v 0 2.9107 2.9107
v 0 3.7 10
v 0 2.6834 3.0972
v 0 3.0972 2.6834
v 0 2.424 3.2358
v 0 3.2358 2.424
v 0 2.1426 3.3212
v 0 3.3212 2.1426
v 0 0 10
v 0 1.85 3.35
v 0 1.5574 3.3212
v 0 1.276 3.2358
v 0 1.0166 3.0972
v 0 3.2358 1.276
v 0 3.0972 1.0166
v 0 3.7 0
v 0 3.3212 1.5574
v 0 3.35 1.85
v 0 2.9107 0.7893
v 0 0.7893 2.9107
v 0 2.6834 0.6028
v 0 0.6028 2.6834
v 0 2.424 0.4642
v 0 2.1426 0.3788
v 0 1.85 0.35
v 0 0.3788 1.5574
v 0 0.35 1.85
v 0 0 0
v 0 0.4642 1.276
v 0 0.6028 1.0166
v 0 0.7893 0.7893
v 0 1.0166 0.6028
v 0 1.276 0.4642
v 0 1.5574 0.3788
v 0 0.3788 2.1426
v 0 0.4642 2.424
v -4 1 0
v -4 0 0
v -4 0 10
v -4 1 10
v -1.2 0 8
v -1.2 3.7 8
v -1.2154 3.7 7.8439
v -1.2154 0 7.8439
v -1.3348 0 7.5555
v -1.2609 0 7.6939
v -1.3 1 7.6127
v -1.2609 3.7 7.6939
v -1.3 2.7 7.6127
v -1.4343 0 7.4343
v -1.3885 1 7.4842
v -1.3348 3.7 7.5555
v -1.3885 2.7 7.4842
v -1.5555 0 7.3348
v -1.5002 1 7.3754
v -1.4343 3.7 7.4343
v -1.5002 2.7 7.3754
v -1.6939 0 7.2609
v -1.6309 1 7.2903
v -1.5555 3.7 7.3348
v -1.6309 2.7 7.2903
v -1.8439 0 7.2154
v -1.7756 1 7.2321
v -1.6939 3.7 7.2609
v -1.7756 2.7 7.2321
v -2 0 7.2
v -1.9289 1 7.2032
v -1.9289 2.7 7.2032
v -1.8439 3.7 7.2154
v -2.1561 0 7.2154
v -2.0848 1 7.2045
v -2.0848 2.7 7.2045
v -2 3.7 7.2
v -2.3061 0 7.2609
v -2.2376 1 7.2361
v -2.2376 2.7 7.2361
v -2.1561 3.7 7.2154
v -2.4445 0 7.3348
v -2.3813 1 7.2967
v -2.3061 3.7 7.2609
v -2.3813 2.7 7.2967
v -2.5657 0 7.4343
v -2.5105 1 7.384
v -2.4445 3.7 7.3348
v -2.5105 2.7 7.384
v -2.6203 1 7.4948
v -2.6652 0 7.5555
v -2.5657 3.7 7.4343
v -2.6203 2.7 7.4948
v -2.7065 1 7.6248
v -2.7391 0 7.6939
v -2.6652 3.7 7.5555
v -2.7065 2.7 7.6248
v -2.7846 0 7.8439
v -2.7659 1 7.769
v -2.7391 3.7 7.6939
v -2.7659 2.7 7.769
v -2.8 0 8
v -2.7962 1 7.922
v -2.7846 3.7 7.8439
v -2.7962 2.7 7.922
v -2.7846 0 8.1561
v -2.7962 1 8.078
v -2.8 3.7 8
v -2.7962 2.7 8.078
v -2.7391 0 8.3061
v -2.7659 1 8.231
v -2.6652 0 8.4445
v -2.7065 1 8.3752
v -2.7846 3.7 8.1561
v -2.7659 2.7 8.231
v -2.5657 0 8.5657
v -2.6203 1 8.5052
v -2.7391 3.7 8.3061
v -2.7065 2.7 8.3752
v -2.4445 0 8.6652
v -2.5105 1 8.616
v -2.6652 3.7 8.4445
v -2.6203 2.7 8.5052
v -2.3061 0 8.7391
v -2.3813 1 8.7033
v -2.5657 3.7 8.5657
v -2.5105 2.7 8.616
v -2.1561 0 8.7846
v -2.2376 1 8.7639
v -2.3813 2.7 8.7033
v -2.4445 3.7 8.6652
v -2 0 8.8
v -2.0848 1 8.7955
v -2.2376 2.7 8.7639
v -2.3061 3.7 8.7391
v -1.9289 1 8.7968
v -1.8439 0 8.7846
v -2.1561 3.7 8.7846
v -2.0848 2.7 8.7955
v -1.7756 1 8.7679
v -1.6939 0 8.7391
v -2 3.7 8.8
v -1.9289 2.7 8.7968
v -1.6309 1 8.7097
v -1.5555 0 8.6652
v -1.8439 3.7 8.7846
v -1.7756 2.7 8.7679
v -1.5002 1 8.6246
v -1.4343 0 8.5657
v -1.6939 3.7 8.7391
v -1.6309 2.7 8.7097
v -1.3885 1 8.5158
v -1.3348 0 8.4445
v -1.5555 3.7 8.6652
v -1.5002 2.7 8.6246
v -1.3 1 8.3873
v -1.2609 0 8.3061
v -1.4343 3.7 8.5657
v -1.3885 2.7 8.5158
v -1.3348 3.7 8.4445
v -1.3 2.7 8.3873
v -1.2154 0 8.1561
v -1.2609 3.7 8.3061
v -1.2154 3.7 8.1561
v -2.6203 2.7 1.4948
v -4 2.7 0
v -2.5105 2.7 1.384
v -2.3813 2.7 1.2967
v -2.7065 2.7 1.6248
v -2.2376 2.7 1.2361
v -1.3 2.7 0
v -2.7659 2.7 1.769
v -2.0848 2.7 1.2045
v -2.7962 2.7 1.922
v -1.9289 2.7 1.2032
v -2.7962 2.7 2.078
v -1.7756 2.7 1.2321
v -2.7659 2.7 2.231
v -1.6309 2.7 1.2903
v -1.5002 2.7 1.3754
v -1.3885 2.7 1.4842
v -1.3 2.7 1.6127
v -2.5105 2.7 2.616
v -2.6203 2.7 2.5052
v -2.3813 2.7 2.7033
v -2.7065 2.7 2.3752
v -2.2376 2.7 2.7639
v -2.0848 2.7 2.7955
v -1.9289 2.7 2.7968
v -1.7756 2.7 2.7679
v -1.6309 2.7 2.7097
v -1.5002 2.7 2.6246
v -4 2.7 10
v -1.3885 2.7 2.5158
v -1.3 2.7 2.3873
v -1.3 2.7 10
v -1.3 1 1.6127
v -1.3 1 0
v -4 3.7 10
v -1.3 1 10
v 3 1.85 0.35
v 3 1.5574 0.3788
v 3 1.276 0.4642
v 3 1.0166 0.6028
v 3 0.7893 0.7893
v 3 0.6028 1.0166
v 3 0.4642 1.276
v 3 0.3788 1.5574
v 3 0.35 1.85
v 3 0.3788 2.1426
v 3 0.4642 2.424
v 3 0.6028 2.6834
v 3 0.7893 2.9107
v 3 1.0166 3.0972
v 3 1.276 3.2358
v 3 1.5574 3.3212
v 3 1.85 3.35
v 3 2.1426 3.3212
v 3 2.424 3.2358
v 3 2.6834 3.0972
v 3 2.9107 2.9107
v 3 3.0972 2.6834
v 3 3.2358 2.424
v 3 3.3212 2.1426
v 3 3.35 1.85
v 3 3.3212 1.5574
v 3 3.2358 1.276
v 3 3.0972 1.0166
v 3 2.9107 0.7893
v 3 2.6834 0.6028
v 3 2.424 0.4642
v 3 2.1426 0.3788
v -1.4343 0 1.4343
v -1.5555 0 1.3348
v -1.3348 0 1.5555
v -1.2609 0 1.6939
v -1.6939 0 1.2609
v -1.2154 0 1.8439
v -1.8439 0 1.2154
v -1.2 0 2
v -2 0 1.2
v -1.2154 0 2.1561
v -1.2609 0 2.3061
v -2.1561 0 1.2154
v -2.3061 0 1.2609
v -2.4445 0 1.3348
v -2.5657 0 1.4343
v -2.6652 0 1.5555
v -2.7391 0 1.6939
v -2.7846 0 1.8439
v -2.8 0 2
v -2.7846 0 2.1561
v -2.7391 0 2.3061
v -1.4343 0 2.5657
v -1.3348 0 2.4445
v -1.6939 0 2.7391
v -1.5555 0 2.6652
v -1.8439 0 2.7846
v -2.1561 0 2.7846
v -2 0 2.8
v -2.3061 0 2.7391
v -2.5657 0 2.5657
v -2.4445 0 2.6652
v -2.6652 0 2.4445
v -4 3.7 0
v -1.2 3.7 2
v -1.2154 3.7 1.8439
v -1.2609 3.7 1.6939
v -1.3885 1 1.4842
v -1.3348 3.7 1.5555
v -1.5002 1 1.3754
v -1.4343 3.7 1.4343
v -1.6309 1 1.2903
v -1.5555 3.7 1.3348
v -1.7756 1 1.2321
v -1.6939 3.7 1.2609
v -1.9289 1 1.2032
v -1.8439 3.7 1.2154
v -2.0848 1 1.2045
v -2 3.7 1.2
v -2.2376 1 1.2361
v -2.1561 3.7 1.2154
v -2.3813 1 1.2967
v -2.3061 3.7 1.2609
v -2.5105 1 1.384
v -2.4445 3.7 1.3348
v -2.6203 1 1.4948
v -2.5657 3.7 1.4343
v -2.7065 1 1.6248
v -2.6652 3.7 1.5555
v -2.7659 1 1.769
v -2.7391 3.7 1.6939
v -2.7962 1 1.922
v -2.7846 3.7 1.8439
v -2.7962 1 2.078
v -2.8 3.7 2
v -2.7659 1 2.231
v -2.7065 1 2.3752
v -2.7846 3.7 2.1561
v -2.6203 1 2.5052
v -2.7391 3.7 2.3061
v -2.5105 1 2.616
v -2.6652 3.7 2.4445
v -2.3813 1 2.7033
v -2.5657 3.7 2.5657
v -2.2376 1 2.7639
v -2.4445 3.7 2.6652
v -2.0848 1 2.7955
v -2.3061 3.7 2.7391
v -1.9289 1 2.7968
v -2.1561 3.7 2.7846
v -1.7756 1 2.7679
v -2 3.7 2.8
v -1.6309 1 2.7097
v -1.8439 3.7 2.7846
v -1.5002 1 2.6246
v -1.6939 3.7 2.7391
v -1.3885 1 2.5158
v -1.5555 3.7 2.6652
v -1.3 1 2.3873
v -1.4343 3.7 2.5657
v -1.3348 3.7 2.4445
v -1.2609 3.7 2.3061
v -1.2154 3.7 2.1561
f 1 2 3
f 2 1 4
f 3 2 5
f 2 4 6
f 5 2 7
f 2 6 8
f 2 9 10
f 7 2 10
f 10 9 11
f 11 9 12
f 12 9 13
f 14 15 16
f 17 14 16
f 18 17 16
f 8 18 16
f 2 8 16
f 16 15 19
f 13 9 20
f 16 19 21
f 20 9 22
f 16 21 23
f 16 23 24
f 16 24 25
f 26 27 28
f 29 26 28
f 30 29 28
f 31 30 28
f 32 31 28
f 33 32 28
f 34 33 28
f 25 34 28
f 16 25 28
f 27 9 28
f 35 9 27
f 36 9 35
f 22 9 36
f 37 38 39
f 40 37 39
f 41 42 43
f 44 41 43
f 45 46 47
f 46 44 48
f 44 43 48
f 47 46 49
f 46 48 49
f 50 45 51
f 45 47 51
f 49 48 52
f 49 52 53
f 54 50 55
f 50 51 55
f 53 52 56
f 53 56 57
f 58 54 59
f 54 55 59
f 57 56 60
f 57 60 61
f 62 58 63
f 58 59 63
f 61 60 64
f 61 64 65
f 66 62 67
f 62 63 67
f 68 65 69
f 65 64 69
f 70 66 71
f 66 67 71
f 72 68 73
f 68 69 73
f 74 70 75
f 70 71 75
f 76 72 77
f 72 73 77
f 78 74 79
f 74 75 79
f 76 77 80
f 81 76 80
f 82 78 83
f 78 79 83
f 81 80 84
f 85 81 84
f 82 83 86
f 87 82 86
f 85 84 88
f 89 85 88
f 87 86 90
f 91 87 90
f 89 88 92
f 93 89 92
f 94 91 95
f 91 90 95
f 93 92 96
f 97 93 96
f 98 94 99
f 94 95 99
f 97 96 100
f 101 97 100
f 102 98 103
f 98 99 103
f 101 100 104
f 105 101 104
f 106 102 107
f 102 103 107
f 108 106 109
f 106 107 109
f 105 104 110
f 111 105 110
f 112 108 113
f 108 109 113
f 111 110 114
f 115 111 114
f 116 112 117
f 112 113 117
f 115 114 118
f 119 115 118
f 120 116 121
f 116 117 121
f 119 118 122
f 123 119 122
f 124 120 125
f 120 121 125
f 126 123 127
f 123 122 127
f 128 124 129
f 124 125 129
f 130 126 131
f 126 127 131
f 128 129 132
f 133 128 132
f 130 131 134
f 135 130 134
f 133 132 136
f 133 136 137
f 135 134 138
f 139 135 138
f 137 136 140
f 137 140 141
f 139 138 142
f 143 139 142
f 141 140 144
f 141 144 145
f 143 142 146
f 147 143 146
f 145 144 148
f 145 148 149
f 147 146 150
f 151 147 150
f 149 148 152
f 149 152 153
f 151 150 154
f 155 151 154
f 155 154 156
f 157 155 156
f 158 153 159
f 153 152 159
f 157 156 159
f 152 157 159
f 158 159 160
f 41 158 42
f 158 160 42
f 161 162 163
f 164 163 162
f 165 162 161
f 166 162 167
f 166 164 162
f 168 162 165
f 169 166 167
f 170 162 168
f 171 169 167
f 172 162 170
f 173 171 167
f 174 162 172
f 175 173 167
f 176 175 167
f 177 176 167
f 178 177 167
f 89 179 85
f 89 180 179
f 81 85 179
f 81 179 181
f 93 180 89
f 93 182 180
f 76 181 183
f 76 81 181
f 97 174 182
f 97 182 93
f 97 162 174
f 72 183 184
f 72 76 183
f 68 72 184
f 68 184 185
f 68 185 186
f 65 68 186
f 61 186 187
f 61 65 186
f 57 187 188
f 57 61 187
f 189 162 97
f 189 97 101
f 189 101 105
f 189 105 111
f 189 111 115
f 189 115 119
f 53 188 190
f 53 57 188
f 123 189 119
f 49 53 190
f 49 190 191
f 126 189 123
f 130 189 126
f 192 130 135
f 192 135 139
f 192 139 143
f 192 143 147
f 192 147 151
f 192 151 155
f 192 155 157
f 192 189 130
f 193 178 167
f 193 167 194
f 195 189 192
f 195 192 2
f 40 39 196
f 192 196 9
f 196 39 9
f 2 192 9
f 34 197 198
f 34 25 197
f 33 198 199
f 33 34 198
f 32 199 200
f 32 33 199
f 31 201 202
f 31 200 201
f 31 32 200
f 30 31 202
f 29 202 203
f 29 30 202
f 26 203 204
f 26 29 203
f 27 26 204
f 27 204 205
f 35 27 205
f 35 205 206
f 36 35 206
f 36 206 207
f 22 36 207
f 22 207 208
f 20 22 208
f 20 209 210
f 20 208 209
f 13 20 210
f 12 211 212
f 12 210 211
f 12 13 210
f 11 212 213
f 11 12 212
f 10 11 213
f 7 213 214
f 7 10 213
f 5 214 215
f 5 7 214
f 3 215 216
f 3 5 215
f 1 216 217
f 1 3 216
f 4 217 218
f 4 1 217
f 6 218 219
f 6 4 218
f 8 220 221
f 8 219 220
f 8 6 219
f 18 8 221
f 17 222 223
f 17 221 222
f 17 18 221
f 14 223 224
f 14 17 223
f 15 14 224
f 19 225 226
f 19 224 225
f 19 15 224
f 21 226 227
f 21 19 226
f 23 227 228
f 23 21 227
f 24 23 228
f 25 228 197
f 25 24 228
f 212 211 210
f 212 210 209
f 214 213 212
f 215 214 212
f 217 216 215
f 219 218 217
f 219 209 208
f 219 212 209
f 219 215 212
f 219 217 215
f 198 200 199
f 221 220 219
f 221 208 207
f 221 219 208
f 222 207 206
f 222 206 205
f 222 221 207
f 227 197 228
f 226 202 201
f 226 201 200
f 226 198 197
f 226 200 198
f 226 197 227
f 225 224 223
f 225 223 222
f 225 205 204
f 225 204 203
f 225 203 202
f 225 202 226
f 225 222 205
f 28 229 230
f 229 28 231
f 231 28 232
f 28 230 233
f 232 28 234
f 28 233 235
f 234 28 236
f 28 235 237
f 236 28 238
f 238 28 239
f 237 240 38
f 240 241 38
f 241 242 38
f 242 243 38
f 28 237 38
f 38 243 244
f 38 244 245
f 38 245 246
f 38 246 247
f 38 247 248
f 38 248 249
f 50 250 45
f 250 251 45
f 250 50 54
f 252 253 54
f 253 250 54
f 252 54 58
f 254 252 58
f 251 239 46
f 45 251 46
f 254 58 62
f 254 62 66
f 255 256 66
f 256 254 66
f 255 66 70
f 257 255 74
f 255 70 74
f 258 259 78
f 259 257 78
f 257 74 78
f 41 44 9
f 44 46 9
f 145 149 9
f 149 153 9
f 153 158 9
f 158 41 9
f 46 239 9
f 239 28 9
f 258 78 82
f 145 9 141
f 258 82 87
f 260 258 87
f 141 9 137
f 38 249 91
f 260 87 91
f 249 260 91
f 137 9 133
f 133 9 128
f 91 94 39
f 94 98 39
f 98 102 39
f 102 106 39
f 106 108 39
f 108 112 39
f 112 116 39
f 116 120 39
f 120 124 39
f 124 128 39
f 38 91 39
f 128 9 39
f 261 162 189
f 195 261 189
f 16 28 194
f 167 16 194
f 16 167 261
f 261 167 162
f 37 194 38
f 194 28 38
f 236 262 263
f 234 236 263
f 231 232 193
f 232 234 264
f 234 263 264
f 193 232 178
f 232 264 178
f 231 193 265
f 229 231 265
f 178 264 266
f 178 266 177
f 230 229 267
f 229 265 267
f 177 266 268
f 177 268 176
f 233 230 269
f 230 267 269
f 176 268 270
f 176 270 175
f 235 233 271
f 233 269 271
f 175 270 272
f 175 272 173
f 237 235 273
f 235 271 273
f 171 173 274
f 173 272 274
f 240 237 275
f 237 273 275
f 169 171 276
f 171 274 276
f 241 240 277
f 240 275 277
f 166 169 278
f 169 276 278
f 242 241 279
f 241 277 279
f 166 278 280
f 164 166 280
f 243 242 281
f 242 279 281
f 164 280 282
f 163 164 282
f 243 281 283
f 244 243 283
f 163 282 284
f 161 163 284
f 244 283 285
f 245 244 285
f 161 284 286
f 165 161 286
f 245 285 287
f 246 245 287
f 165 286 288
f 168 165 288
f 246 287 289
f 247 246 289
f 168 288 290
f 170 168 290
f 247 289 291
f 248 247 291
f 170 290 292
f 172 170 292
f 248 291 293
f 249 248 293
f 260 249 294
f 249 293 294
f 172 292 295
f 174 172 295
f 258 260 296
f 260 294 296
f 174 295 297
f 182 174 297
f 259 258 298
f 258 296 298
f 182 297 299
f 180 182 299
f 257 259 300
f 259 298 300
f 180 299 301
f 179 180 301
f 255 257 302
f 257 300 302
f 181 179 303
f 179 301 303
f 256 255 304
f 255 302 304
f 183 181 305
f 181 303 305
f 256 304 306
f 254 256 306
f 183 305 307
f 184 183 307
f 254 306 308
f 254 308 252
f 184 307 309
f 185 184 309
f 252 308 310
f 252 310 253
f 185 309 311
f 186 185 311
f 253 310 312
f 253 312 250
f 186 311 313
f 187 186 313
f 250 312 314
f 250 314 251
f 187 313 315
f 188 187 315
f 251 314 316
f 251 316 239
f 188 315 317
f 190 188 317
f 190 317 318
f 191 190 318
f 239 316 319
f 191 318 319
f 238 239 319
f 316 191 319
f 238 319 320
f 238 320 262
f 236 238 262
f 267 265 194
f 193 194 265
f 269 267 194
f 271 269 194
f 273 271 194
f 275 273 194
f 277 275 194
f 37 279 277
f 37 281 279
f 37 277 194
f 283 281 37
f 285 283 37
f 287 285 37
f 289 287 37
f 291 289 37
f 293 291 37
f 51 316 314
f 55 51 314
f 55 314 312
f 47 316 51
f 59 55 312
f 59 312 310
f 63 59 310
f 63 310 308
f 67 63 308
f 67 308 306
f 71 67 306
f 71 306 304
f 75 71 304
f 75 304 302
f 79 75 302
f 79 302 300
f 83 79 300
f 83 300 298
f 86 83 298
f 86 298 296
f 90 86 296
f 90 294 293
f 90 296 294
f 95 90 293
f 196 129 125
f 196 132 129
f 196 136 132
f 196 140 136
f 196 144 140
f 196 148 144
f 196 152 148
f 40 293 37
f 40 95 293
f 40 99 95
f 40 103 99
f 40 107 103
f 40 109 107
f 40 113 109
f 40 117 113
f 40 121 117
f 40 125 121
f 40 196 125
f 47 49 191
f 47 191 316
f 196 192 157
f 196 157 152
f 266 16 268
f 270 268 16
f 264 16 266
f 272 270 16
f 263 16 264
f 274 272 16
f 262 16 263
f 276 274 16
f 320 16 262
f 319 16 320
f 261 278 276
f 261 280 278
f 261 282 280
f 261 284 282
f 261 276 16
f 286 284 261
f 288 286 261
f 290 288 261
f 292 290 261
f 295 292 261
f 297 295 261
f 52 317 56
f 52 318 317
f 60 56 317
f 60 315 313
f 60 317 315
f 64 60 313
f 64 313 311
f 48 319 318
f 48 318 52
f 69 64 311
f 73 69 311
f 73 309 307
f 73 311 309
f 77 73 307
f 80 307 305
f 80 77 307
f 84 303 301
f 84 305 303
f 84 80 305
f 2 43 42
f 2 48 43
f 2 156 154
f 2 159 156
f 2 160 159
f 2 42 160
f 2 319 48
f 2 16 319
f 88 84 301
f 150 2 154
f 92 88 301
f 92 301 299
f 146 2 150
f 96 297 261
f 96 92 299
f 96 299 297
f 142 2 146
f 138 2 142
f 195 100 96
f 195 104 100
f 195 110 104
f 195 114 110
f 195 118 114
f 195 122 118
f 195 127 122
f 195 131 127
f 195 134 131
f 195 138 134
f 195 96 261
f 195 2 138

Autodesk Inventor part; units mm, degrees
ref_plane "YZ Plane" through (0, 0, 0) normal (1, 0, 0) x (0, 1, 0)
ref_plane "XZ Plane" through (0, 0, 0) normal (0, 1, 0) x (-1, 0, 0)
ref_plane "XY Plane" through (0, 0, 0) normal (0, 0, 1) x (1, 0, 0)
sketch "スケッチ1" plane through (0, 0, 0) normal (0, 1, 0) x (-1, 0, 0)
  line L0 (0, 0) -> (4, 0)
  line L1 (4, 0) -> (4, 10)
  line L2 (4, 10) -> (0, 10)
  line L3 (0, 10) -> (0, 0)
  dimension "d0" = 4
  dimension "d1" = 10
extrude "押し出し1" add sketch "スケッチ1" along normal blind 3.7
sketch "スケッチ2" plane through (-4, 0, 10) normal (0, 0, 1) x (1, 0, 0)
  line L0 (0, 0) -> (0, 3.7) projected
  line L1 (0, 2.7) -> (2.7, 2.7)
  line L2 (2.7, 2.7) -> (2.7, 1)
  line L3 (2.7, 1) -> (0, 1)
  line L4 (0, 1) -> (0, 2.7)
  point P0 (4, 0)
  point P1 (0, 1.85)
  dimension "d4" = 2.7
  dimension "d5" = 1.7
extrude "押し出し2" cut sketch "スケッチ2" against normal through all
sketch "スケッチ3" plane through (0, 0, 10) normal (1, 0, 0) x (0, 0, -1)
  line L0 (0, 0) -> (10, 0) projected
  line L1 (0, 3.7) -> (10, 3.7) projected
  circle A0 centre (8.15, 1.85) radius 1.85
  line L2 (10, 0) -> (10, 3.7) projected
  circle A1 centre (8.15, 1.85) radius 1.5
  dimension "d8" = 3
extrude "押し出し3" add sketch "スケッチ3" along normal blind 3 contours A1
sketch "スケッチ4" plane through (0, 3.7, 0) normal (0, 1, 0) x (1, 0, 0)
  line L0 (0, -10) -> (0, 0) projected
  line L1 (0, 0) -> (-4, 0) projected
  line L2 (-4, 0) -> (-4, -10) projected
  circle A0 centre (-2, -2) radius 0.8
  circle A1 centre (-2, -8) radius 2 construction
  line L3 (-4, -10) -> (0, -10) projected
  circle A2 centre (-2, -8) radius 0.8
  dimension "d15" = 1.6
  dimension "d18" = 1.6
extrude "押し出し4" cut sketch "スケッチ4" against normal through all contours A0 | A2
properties part number "chest_cover_axis_right"
